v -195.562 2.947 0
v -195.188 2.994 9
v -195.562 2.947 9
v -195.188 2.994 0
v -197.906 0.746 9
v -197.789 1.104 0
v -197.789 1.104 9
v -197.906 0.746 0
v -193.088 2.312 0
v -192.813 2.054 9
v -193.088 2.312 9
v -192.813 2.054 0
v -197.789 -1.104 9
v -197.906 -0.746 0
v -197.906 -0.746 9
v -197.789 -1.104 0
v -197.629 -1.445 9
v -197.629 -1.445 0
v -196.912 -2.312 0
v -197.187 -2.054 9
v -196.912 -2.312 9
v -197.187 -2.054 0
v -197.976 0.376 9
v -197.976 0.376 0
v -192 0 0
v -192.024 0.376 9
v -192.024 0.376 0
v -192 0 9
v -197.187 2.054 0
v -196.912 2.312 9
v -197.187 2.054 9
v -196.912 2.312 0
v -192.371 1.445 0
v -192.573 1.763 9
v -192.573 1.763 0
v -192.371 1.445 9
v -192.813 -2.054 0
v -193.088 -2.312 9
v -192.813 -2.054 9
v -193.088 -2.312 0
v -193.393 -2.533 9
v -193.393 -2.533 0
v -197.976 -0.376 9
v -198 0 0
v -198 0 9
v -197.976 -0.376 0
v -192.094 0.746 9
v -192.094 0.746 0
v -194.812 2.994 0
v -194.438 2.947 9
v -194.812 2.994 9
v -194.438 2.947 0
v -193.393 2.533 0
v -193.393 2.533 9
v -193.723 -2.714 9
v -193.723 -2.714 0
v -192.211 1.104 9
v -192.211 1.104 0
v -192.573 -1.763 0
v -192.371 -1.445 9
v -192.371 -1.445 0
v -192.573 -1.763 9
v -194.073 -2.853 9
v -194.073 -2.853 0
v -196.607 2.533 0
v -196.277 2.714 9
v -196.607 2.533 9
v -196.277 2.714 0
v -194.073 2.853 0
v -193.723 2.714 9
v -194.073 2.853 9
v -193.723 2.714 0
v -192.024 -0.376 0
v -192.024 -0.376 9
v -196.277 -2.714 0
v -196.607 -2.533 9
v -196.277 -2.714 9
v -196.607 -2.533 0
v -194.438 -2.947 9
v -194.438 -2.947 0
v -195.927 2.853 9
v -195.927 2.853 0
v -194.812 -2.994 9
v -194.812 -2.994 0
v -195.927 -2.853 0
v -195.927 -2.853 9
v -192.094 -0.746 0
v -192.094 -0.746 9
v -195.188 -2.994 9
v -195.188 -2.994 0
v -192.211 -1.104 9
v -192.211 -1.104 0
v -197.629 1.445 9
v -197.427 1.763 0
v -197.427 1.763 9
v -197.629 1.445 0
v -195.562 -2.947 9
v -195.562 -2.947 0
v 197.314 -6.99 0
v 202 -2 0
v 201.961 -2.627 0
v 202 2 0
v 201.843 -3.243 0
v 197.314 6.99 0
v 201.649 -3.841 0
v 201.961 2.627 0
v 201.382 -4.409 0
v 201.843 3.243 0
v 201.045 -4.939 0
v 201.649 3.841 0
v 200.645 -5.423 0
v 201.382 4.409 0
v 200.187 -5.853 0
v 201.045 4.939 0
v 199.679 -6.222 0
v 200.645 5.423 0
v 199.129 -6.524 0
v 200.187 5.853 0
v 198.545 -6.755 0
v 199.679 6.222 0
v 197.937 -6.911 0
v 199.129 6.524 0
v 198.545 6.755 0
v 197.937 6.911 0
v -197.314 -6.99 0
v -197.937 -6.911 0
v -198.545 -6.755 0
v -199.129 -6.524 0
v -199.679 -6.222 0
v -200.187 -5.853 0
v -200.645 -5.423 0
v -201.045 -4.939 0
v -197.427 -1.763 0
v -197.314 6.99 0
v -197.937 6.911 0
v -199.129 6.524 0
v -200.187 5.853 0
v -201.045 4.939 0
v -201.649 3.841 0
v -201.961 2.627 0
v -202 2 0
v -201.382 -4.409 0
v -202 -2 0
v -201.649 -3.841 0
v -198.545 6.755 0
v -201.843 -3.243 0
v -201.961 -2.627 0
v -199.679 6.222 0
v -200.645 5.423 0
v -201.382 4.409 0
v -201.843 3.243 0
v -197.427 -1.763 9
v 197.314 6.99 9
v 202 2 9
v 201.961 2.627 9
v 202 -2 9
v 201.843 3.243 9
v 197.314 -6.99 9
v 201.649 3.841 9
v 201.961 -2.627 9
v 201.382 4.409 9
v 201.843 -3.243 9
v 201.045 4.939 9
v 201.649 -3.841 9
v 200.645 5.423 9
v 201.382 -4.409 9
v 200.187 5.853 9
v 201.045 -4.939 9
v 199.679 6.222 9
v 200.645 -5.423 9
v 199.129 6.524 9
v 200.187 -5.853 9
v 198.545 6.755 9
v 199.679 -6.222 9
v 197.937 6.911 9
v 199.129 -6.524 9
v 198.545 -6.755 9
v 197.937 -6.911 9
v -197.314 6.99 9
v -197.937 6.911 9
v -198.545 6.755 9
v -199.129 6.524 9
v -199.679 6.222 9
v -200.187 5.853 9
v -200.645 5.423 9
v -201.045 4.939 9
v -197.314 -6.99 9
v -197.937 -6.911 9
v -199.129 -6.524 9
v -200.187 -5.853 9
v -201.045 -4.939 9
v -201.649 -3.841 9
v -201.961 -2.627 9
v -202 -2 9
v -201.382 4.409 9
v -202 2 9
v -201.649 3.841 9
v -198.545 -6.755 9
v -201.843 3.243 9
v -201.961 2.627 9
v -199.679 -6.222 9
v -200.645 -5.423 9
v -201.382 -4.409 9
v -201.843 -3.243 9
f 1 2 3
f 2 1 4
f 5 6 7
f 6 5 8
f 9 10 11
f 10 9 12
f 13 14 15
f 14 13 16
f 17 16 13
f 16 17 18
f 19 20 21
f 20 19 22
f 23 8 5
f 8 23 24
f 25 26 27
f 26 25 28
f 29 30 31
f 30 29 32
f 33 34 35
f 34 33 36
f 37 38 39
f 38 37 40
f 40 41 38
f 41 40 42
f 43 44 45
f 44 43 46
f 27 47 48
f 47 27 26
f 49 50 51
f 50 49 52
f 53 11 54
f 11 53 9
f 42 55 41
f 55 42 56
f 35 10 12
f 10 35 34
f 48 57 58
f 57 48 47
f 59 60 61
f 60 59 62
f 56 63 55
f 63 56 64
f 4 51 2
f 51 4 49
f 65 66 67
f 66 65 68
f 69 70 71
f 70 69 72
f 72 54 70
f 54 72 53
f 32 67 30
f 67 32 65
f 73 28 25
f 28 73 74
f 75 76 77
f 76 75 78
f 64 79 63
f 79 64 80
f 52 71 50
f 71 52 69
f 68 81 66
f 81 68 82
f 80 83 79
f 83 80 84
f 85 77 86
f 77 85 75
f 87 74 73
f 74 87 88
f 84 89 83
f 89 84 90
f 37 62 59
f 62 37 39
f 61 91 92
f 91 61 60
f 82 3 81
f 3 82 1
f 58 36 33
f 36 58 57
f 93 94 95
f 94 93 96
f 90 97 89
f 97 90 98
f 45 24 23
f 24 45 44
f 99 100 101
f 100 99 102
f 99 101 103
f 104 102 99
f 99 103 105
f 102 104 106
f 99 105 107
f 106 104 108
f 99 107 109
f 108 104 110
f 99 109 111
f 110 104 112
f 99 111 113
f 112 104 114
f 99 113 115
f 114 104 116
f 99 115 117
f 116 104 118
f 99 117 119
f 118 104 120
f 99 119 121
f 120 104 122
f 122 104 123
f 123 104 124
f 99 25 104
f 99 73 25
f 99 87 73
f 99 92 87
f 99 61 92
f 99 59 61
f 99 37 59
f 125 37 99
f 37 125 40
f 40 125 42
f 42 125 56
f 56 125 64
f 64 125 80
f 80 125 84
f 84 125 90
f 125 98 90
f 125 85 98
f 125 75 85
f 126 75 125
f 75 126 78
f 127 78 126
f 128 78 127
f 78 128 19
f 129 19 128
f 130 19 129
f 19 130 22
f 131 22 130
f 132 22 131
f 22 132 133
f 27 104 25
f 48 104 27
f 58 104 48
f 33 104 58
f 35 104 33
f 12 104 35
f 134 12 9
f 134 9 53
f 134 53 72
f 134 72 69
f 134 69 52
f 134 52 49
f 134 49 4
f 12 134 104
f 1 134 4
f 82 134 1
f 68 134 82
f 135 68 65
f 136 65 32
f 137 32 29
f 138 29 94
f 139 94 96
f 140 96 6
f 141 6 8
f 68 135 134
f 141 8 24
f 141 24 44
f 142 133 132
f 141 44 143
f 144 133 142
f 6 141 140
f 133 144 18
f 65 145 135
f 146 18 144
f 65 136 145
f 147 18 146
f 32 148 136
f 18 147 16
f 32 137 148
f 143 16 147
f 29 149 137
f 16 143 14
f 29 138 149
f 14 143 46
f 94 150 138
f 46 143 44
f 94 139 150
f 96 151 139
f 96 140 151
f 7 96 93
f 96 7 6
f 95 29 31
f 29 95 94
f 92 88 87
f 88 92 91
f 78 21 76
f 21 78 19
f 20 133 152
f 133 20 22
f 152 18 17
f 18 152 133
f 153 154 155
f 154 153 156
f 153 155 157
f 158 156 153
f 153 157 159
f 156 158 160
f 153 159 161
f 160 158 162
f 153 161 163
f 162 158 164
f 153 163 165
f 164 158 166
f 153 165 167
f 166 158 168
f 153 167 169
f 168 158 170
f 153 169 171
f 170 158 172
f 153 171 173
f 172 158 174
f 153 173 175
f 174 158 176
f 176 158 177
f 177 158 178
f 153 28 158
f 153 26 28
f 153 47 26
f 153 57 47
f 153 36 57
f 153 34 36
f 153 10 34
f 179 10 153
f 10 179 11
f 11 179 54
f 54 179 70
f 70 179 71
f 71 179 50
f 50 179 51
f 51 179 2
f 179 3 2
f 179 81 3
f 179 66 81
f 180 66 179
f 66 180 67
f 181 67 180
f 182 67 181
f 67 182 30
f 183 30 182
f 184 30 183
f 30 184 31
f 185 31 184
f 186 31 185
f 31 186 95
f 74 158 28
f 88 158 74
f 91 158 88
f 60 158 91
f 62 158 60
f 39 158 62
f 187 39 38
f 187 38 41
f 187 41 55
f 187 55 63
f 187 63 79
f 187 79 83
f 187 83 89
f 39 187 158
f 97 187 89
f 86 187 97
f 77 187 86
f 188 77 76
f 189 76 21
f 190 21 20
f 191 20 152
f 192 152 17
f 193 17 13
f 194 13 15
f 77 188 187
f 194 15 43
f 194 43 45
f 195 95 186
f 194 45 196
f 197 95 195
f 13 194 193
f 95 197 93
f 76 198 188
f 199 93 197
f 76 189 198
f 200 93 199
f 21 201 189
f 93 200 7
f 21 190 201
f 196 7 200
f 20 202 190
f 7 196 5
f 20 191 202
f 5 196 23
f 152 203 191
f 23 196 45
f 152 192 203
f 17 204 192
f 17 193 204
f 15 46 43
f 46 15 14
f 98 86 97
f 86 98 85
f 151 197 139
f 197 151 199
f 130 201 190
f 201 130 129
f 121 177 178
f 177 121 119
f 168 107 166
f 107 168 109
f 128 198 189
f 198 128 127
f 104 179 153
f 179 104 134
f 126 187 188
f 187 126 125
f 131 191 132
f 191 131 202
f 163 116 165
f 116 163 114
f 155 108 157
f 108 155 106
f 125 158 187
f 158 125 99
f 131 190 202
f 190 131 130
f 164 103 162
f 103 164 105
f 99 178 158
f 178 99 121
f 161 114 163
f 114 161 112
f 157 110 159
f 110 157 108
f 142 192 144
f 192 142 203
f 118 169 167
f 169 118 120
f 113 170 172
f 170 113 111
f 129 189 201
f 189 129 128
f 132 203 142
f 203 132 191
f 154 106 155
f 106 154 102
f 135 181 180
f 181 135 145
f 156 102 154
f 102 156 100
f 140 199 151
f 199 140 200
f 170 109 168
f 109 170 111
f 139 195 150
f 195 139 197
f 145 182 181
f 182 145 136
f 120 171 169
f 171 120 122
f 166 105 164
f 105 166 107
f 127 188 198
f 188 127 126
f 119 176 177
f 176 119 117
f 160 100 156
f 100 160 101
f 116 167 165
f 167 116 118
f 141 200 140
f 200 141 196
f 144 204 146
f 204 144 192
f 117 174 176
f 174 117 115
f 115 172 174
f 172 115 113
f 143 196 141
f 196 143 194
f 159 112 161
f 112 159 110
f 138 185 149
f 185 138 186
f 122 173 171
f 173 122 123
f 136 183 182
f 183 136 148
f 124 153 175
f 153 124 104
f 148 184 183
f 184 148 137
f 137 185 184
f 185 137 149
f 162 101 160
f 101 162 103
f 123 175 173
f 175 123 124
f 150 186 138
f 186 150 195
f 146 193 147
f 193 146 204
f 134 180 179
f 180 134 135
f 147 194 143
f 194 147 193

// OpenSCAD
$fn = 50;


difference() {
	union() {
		hull() {
			translate(v = [-197.0000000000, 2.0000000000, 0]) {
				cylinder(h = 9, r = 5);
			}
			translate(v = [197.0000000000, 2.0000000000, 0]) {
				cylinder(h = 9, r = 5);
			}
			translate(v = [-197.0000000000, -2.0000000000, 0]) {
				cylinder(h = 9, r = 5);
			}
			translate(v = [197.0000000000, -2.0000000000, 0]) {
				cylinder(h = 9, r = 5);
			}
		}
	}
	union() {
		translate(v = [-195.0000000000, 0.0000000000, 0]) {
			cylinder(h = 9, r = 3.0000000000);
		}
		translate(v = [-195.0000000000, 0.0000000000, 0]) {
			cylinder(h = 9, r = 1.5000000000);
		}
		translate(v = [-195.0000000000, 0.0000000000, 0]) {
			cylinder(h = 9, r = 1.5000000000);
		}
		translate(v = [-195.0000000000, 0.0000000000, 0]) {
			cylinder(h = 9, r = 1.5000000000);
		}
	}
}
